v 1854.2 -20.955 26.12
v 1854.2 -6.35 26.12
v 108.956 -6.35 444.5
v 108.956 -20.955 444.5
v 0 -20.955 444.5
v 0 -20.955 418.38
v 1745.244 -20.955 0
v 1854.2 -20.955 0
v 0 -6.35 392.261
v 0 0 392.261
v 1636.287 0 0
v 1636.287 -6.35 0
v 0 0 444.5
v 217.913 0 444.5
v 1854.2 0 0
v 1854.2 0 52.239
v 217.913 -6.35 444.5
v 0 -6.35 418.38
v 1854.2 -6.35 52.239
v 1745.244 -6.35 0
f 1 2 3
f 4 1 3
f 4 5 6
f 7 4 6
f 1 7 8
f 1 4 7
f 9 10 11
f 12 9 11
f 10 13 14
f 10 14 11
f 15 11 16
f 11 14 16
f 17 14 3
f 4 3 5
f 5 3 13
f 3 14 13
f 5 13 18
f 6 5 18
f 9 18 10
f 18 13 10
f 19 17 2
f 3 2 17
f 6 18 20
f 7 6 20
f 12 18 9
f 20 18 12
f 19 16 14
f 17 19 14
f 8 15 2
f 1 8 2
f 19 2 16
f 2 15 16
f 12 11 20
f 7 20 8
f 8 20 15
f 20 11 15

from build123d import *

# Parameters (mm, degrees)
F1_DEPTH = 20.955
F2_DEPTH = 6.35


with BuildPart() as f1:
    # F0 (on Front) → F1 (new body)
    with BuildSketch(Plane.XZ):
        Polygon((0, 418.380344), (1745.243721, 0), (1854.2, 0), (0, 444.5), align=None)
        Polygon((0, 444.5), (1854.2, 0), (1854.2, 26.119656), (108.956279, 444.5), align=None)
    extrude(amount=F1_DEPTH)

    # F0 (on Front) → F2 (join)
    with BuildSketch(Plane.XZ):
        Polygon((0, 392.260688), (1636.287443, 0), (1745.243721, 0), (0, 418.380344), align=None)
        Polygon((0, 418.380344), (1745.243721, 0), (1854.2, 0), (0, 444.5), align=None)
        Polygon((0, 444.5), (1854.2, 0), (1854.2, 26.119656), (108.956279, 444.5), align=None)
        Polygon((108.956279, 444.5), (1854.2, 26.119656), (1854.2, 52.239312), (217.912557, 444.5), align=None)
    extrude(amount=F2_DEPTH)


solid = f1.part
